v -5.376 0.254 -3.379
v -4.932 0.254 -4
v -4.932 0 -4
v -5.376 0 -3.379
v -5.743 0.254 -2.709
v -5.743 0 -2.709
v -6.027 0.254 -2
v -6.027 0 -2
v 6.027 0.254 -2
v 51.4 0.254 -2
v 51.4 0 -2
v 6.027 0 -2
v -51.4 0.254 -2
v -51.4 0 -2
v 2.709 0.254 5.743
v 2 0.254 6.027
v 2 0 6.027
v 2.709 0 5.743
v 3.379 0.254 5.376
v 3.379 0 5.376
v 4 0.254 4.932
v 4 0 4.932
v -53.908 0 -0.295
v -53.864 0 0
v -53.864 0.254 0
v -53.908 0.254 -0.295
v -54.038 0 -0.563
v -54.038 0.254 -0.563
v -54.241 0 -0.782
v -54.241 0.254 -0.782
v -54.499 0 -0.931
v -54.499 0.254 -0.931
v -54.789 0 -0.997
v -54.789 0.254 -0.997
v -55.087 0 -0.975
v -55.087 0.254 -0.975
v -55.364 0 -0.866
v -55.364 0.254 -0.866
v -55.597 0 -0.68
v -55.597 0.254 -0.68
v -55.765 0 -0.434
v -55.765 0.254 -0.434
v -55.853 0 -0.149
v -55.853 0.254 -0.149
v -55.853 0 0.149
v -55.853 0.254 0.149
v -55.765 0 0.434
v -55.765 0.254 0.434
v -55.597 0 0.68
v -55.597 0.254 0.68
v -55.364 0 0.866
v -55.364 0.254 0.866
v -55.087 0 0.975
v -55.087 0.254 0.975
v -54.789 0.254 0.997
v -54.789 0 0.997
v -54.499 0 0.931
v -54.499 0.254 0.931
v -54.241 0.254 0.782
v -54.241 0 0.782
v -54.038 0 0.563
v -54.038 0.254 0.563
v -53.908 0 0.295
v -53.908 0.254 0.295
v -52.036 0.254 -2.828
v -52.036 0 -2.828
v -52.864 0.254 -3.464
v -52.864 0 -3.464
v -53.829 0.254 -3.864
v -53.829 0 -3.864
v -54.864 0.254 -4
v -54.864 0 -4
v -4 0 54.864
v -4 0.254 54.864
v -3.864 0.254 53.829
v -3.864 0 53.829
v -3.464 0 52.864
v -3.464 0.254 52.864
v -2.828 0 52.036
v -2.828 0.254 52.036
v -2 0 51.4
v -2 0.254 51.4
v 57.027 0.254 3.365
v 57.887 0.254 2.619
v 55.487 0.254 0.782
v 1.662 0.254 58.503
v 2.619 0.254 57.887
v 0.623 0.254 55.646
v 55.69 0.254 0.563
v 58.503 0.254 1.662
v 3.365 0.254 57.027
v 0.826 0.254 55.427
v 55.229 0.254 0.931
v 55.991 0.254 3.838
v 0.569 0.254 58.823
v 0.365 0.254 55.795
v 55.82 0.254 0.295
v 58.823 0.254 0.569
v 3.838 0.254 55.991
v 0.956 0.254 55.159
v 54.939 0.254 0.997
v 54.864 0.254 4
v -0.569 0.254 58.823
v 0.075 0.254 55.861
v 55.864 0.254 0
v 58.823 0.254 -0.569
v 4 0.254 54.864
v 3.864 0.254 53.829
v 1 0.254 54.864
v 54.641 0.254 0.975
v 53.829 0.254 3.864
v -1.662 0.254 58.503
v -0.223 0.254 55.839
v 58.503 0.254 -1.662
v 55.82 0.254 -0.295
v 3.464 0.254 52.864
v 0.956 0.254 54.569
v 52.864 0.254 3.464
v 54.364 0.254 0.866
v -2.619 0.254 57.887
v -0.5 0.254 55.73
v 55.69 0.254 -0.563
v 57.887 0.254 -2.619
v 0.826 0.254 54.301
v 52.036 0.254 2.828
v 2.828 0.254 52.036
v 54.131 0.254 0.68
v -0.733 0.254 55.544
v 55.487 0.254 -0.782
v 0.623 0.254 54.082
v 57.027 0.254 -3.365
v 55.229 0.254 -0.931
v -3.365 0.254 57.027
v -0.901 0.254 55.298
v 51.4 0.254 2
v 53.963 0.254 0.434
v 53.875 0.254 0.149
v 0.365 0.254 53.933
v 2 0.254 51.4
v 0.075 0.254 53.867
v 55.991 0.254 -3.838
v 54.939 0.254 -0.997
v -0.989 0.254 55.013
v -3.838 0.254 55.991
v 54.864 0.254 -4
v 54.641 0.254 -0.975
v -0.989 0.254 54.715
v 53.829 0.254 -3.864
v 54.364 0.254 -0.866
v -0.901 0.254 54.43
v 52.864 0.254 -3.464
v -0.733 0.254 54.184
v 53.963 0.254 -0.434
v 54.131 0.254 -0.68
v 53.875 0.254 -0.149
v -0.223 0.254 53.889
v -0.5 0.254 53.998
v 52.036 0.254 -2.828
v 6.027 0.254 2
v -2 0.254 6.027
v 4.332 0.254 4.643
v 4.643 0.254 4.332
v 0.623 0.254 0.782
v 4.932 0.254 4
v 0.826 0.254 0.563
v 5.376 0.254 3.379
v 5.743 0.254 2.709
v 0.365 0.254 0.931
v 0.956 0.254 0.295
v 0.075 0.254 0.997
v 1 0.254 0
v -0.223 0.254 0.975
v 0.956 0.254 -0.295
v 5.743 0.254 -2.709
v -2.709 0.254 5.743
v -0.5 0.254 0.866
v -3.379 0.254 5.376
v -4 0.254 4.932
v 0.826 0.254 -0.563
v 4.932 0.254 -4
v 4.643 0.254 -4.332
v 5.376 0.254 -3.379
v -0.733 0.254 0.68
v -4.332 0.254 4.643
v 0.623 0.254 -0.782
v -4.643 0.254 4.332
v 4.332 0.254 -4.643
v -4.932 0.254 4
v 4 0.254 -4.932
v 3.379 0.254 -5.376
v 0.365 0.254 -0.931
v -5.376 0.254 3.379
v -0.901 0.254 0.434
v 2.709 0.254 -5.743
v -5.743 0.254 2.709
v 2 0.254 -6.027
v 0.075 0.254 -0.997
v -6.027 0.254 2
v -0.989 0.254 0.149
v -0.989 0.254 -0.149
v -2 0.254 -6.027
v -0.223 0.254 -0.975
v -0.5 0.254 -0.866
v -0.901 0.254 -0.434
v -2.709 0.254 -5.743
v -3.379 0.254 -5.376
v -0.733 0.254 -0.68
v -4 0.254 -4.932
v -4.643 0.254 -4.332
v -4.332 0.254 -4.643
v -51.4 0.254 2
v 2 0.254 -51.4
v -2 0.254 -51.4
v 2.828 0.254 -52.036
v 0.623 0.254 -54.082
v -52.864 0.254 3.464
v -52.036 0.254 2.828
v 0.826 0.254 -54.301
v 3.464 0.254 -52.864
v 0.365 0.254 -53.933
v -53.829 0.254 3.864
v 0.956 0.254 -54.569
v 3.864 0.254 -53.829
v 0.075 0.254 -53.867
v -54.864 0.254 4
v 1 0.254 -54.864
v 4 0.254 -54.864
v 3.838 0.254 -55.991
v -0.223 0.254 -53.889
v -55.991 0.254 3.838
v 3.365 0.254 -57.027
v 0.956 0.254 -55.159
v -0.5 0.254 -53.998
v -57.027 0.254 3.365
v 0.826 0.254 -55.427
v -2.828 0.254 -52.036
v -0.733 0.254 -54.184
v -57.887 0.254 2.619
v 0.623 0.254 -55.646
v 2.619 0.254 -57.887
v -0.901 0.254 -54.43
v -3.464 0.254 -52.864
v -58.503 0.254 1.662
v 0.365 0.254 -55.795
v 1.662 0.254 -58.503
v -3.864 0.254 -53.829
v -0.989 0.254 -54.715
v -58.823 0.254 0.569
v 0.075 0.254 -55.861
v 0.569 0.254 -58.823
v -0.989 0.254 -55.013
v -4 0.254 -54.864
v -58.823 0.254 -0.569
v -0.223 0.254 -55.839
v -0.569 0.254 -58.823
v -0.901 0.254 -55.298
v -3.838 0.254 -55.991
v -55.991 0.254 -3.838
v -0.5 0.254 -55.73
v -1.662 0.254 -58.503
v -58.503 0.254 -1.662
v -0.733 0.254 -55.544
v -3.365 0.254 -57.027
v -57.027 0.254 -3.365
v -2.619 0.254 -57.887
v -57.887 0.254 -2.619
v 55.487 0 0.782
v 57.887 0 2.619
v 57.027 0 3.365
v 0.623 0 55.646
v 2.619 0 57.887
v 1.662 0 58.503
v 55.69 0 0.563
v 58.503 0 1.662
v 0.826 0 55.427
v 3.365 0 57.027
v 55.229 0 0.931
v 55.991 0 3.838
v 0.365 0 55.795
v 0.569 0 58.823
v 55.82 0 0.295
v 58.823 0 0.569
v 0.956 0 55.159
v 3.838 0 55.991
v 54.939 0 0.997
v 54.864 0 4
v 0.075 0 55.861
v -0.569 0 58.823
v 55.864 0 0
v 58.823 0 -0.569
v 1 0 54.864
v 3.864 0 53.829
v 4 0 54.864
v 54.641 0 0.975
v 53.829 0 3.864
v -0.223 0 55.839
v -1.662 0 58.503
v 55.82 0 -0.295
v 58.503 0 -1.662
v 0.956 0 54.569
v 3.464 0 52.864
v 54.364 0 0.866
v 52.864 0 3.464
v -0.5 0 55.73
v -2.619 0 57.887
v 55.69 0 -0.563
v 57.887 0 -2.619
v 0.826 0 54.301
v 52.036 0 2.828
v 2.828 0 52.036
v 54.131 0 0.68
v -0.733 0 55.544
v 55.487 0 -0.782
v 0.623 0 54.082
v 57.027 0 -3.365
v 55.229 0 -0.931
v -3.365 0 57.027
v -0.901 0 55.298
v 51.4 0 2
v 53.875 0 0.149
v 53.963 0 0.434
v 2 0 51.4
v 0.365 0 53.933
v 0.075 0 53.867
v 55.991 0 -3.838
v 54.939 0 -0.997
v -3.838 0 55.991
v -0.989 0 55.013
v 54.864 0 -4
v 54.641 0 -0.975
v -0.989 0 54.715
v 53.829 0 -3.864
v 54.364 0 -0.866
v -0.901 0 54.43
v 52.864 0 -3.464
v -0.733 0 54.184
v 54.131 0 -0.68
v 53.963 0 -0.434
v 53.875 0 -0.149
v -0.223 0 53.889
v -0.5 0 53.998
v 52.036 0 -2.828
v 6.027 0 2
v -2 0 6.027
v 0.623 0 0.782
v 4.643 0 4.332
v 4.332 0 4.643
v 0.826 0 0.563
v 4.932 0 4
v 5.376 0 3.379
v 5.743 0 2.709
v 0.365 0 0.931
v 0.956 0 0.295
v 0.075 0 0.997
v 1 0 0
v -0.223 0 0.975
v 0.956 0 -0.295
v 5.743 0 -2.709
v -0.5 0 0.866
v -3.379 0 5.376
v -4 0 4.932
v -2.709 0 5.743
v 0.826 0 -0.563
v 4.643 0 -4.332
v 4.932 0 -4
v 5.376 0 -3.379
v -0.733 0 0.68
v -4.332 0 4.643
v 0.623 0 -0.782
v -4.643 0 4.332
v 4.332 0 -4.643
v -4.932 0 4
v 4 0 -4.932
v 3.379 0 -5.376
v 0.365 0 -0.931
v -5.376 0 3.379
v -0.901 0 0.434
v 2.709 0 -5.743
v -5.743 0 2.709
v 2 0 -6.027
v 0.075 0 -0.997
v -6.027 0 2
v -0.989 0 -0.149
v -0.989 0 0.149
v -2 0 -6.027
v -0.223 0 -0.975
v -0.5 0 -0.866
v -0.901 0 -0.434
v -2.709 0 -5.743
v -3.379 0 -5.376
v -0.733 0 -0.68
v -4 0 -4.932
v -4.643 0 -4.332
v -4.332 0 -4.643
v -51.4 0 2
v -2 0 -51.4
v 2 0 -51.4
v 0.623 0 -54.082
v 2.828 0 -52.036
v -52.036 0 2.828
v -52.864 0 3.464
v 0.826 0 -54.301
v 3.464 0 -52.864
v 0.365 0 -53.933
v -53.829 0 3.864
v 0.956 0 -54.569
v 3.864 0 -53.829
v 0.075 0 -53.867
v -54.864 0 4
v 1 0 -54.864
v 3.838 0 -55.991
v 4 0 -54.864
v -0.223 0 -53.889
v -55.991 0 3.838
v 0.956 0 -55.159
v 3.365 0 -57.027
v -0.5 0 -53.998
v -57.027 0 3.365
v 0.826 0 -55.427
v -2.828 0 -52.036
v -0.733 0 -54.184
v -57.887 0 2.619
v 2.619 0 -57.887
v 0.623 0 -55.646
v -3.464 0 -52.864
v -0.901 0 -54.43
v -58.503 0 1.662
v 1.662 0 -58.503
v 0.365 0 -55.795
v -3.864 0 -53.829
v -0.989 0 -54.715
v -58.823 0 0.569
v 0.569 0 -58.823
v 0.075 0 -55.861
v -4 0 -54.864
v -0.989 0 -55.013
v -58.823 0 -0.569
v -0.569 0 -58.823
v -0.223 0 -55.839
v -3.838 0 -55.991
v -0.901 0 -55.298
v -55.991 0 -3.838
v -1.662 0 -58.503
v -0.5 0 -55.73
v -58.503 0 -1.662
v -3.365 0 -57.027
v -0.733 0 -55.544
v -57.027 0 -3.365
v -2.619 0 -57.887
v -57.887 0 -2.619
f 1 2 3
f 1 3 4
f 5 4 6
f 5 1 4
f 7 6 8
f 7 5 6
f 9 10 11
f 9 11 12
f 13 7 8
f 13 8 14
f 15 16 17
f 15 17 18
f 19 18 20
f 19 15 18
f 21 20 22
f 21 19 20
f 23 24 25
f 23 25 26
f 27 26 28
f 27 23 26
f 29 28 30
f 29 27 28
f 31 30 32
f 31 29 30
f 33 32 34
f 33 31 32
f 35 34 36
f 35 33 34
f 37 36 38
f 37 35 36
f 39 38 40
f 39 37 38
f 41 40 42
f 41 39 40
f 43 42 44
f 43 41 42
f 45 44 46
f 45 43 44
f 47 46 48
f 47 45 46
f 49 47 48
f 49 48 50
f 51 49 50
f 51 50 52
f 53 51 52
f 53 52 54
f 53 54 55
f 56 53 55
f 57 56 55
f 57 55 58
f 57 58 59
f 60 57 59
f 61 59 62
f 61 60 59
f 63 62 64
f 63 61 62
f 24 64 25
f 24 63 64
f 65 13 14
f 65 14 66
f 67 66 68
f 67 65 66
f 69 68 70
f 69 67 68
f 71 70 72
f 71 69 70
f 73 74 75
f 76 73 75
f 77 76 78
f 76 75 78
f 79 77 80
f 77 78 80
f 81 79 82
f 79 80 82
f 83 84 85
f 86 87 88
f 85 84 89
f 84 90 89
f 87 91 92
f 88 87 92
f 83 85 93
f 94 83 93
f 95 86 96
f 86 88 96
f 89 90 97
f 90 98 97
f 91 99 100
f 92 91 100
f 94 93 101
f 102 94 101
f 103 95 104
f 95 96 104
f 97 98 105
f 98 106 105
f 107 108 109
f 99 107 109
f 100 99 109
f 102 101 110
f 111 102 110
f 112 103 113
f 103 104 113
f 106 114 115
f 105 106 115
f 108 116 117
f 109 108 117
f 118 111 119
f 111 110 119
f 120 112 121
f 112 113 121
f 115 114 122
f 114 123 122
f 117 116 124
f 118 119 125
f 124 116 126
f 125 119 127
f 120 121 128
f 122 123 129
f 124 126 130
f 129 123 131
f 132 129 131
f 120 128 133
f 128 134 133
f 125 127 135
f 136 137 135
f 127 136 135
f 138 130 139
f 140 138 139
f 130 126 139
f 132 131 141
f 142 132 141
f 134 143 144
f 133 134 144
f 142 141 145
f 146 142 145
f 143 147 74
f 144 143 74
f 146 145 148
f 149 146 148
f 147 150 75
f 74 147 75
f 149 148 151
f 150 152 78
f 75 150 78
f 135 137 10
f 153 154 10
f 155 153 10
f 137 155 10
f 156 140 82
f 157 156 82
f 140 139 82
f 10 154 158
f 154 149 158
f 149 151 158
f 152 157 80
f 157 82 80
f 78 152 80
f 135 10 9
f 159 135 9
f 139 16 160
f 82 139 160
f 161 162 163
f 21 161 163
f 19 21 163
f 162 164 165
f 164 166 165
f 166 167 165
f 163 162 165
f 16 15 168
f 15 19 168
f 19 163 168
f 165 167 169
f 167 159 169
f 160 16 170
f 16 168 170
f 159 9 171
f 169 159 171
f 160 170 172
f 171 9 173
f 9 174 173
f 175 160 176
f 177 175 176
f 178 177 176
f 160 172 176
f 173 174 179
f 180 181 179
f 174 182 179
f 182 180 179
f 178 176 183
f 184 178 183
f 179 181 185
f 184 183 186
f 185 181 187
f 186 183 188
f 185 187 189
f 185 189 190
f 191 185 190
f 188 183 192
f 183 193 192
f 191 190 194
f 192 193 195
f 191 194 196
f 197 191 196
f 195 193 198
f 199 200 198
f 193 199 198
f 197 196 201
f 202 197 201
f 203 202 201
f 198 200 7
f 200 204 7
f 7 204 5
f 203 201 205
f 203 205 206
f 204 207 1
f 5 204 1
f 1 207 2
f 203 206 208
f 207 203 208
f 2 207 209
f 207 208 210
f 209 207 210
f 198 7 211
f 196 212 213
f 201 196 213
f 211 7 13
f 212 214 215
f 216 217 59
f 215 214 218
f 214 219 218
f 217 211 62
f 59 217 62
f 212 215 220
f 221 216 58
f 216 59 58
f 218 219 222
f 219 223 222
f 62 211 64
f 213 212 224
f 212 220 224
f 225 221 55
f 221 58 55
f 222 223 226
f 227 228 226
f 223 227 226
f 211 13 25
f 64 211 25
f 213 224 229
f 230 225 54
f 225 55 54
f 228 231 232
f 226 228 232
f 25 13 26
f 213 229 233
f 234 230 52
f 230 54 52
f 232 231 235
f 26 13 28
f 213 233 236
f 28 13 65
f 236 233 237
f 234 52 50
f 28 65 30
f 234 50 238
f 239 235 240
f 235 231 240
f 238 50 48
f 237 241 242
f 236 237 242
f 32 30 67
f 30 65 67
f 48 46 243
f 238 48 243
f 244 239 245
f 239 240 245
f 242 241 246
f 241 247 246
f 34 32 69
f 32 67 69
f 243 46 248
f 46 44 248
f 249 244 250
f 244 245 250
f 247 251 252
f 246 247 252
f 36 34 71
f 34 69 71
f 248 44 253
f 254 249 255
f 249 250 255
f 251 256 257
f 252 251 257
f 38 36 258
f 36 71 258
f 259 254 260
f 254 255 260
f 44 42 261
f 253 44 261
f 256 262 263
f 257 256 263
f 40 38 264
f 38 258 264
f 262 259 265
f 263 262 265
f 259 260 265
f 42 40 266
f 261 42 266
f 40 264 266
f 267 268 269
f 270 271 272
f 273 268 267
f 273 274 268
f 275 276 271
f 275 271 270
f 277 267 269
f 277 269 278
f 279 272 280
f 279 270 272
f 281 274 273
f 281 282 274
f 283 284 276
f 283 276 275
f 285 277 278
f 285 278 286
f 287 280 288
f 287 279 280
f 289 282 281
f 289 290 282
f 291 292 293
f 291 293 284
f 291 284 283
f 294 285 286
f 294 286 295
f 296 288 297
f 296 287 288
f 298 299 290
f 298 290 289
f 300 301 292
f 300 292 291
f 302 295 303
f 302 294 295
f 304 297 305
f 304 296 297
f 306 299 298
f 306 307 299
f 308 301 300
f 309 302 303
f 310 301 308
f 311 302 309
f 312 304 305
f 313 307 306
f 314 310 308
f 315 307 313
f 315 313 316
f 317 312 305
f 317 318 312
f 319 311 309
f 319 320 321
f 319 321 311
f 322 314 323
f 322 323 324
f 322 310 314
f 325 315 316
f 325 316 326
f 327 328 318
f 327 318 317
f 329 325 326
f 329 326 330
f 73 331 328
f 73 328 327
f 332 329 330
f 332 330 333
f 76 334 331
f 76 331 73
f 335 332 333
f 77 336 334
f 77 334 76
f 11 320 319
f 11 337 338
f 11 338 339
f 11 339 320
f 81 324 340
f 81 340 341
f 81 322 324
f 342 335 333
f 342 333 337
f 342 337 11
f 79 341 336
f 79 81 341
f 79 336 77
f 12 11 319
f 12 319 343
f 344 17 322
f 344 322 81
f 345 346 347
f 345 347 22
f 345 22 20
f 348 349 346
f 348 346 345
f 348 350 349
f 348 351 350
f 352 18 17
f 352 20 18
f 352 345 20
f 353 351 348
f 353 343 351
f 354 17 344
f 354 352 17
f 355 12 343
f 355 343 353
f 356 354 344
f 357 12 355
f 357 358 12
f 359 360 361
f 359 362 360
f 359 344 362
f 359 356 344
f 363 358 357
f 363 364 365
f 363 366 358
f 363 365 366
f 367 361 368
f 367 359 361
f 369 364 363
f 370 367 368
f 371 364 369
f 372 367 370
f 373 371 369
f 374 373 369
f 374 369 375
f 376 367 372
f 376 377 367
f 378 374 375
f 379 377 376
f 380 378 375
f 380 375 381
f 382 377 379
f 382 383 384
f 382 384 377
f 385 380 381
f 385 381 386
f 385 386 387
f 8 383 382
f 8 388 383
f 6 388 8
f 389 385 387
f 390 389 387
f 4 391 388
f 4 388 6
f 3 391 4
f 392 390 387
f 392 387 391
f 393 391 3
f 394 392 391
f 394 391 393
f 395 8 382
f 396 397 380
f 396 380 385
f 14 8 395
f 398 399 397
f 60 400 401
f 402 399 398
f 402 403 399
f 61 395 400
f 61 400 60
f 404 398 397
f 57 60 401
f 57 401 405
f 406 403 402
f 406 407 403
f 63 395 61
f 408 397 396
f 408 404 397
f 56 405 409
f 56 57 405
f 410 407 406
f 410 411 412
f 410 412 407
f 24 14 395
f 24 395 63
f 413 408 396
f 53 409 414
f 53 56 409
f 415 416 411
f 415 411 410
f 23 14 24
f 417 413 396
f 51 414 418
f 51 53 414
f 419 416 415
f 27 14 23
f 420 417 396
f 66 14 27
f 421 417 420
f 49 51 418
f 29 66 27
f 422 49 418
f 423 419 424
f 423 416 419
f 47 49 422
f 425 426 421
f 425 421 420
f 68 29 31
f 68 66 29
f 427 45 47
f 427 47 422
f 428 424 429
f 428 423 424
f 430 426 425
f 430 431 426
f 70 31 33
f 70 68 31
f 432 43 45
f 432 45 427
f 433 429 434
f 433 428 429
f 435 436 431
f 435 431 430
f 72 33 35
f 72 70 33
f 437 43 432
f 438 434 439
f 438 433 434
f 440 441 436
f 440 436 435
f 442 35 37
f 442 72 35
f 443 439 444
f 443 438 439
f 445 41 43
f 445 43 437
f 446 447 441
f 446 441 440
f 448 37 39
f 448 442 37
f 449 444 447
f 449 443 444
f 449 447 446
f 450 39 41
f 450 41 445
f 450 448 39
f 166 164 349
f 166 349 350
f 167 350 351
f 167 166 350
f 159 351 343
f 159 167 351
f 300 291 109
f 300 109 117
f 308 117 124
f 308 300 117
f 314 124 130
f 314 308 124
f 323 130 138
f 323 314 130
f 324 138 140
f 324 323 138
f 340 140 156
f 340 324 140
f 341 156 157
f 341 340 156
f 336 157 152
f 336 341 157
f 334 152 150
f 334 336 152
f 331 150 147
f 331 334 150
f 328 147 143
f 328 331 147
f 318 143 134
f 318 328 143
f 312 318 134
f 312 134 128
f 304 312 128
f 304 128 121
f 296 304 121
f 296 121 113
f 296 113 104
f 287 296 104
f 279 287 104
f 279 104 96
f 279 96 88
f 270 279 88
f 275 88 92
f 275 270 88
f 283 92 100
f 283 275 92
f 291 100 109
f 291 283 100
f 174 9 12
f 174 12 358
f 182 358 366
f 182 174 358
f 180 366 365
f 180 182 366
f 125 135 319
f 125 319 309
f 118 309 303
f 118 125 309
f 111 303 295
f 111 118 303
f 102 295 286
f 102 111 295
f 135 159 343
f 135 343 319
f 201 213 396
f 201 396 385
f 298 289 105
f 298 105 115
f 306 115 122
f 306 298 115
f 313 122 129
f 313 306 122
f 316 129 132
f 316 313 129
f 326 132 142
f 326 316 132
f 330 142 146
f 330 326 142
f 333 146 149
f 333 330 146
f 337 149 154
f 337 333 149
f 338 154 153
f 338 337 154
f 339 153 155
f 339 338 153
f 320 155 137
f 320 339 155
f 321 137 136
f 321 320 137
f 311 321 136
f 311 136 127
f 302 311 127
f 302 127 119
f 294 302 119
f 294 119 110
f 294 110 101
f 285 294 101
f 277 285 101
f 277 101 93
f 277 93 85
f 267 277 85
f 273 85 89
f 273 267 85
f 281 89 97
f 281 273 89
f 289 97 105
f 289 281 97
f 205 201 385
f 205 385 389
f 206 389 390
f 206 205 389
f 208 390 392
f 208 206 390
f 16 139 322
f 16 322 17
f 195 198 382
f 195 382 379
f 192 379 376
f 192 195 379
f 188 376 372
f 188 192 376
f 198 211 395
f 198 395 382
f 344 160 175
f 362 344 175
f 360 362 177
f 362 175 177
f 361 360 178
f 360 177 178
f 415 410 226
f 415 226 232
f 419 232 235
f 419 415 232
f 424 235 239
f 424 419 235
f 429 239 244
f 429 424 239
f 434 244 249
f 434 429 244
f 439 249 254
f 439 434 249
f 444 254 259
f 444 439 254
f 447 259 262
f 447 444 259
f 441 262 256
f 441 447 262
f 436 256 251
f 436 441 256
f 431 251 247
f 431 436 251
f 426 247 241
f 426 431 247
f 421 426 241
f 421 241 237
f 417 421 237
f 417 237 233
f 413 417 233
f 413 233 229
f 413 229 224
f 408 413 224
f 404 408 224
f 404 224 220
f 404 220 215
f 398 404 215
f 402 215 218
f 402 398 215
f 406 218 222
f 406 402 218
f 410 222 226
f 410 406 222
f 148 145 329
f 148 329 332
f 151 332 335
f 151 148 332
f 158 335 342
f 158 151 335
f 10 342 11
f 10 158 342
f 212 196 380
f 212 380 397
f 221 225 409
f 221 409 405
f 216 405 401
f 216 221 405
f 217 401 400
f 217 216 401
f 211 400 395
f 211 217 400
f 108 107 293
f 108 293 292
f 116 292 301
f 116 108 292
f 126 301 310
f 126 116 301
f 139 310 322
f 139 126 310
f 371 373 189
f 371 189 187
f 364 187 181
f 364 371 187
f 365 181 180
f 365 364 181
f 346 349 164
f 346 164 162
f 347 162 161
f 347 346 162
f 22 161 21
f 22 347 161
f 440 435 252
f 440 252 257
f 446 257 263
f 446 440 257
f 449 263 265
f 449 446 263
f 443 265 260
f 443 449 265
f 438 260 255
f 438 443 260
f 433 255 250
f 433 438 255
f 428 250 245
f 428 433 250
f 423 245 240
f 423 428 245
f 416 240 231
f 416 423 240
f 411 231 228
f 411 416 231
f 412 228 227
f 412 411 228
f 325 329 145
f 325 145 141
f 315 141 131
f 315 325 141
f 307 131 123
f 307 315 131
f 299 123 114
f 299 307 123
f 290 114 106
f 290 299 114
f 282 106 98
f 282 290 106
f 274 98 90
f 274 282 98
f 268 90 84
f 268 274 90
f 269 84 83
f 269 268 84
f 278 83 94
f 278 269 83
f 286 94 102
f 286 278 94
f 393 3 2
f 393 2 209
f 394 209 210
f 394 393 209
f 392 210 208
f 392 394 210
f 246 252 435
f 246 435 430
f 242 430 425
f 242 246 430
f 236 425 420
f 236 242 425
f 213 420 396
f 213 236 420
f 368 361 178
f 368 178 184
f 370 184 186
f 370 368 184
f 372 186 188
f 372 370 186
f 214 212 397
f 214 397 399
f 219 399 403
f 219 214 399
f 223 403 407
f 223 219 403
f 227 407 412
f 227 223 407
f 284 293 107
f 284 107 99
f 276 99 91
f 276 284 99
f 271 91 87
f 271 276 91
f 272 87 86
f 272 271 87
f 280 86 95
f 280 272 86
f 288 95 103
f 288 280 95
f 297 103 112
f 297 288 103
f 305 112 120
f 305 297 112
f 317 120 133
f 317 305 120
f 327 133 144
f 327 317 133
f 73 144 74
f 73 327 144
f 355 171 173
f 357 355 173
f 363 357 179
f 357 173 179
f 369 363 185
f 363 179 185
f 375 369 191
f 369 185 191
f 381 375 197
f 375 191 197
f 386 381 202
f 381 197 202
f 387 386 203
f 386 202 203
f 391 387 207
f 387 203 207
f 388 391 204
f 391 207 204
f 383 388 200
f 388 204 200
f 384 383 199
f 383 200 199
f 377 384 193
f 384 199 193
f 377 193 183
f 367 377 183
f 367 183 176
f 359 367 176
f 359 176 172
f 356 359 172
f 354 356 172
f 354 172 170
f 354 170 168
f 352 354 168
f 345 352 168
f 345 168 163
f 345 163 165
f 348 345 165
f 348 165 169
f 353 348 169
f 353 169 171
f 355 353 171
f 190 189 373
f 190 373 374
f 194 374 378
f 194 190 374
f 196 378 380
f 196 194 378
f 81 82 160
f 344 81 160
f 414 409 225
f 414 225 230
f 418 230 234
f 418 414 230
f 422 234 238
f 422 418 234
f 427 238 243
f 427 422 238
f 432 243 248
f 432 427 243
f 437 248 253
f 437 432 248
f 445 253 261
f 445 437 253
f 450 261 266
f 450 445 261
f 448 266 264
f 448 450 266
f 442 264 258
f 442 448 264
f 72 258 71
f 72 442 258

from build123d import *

# Parameters (mm, degrees)
SKETCH1_R           = 1
BOSS_EXTRUDE1_DEPTH = 0.254
SKETCH2_R           = 1
CUT_EXTRUDE1_DEPTH  = 10


with BuildPart() as part:
    # Sketch1 → Boss-Extrude1 (new body)
    with BuildSketch(Plane(origin=(0, 0, 0), x_dir=(1, 0, 0), z_dir=(0, 1, 0))):
        with BuildLine():
            Line((-54.864, 4), (-4.931784667, 4))
            ThreePointArc((-4.931784667, 4), (-4.490128061, 4.490128061), (-4, 4.931784667))
            Line((-4, 4.931784667), (-4, 54.864))
            ThreePointArc((-4, 54.864), (0, 58.864), (4, 54.864))
            Line((4, 54.864), (4, 4.931784667))
            ThreePointArc((4, 4.931784667), (4.490128061, 4.490128061), (4.931784667, 4))
            Line((4.931784667, 4), (54.864, 4))
            ThreePointArc((54.864, 4), (58.864, 0), (54.864, -4))
            Line((54.864, -4), (4.931784667, -4))
            ThreePointArc((4.931784667, -4), (4.490128061, -4.490128061), (4, -4.931784667))
            Line((4, -4.931784667), (4, -54.864))
            ThreePointArc((4, -54.864), (0, -58.864), (-4, -54.864))
            Line((-4, -54.864), (-4, -4.931784667))
            ThreePointArc((-4, -4.931784667), (-4.490128061, -4.490128061), (-4.931784667, -4))
            Line((-4.931784667, -4), (-54.864, -4))
            ThreePointArc((-54.864, -4), (-58.864, 0), (-54.864, 4))
        make_face()
        with Locations((-54.864, 0)):
            Circle(SKETCH1_R, mode=Mode.SUBTRACT)
        with Locations((0, 54.864)):
            Circle(SKETCH1_R, mode=Mode.SUBTRACT)
        with Locations((54.864, 0)):
            Circle(SKETCH1_R, mode=Mode.SUBTRACT)
        with Locations((0, -54.864)):
            Circle(SKETCH1_R, mode=Mode.SUBTRACT)
    extrude(amount=BOSS_EXTRUDE1_DEPTH)

    # Sketch2 → Cut-Extrude1 (cut)
    with BuildSketch(Plane(origin=(0, 0.254, 0), x_dir=(1, 0, 0), z_dir=(0, 1, 0))):
        Circle(SKETCH2_R)
        with BuildLine():
            Line((-2, -51.399898385), (-2, -6.026815079))
            ThreePointArc((-2, -6.026815079), (-3.049552902, -5.569804943), (-4, -4.931784667))
            Line((-4, -4.931784667), (-4, -54.864))
            ThreePointArc((-4, -54.864), (-3.464101615, -52.864), (-2, -51.399898385))
        make_face()
        with BuildLine():
            Line((2, -51.399898385), (2, -6.026815079))
            ThreePointArc((2, -6.026815079), (3.049552902, -5.569804943), (4, -4.931784667))
            Line((4, -4.931784667), (4, -54.864))
            ThreePointArc((4, -54.864), (3.464101615, -52.864), (2, -51.399898385))
        make_face()
        with BuildLine():
            Line((-54.864, 4), (-4.931784667, 4))
            ThreePointArc((-4.931784667, 4), (-5.569804943, 3.049552902), (-6.026815079, 2))
            Line((-6.026815079, 2), (-51.399898385, 2))
            ThreePointArc((-51.399898385, 2), (-52.864, 3.464101615), (-54.864, 4))
        make_face()
        with BuildLine():
            Line((-51.399898385, -2), (-6.026815079, -2))
            ThreePointArc((-6.026815079, -2), (-5.569804943, -3.049552902), (-4.931784667, -4))
            Line((-4.931784667, -4), (-54.864, -4))
            ThreePointArc((-54.864, -4), (-52.864, -3.464101615), (-51.399898385, -2))
        make_face()
        with BuildLine():
            Line((4, 54.864), (4, 4.931784667))
            ThreePointArc((4, 4.931784667), (3.049552902, 5.569804943), (2, 6.026815079))
            Line((2, 6.026815079), (2, 51.399898385))
            ThreePointArc((2, 51.399898385), (3.464101615, 52.864), (4, 54.864))
        make_face()
        with BuildLine():
            Line((-2, 51.399898385), (-2, 6.026815079))
            ThreePointArc((-2, 6.026815079), (-3.049552902, 5.569804943), (-4, 4.931784667))
            Line((-4, 4.931784667), (-4, 54.864))
            ThreePointArc((-4, 54.864), (-3.464101615, 52.864), (-2, 51.399898385))
        make_face()
        with BuildLine():
            Line((54.864, -4), (4.931784667, -4))
            ThreePointArc((4.931784667, -4), (5.569804943, -3.049552902), (6.026815079, -2))
            Line((6.026815079, -2), (51.399898385, -2))
            ThreePointArc((51.399898385, -2), (52.864, -3.464101615), (54.864, -4))
        make_face()
        with BuildLine():
            Line((51.399898385, 2), (6.026815079, 2))
            ThreePointArc((6.026815079, 2), (5.569804943, 3.049552902), (4.931784667, 4))
            Line((4.931784667, 4), (54.864, 4))
            ThreePointArc((54.864, 4), (52.864, 3.464101615), (51.399898385, 2))
        make_face()
    extrude(amount=-CUT_EXTRUDE1_DEPTH, mode=Mode.SUBTRACT)


solid = part.part
